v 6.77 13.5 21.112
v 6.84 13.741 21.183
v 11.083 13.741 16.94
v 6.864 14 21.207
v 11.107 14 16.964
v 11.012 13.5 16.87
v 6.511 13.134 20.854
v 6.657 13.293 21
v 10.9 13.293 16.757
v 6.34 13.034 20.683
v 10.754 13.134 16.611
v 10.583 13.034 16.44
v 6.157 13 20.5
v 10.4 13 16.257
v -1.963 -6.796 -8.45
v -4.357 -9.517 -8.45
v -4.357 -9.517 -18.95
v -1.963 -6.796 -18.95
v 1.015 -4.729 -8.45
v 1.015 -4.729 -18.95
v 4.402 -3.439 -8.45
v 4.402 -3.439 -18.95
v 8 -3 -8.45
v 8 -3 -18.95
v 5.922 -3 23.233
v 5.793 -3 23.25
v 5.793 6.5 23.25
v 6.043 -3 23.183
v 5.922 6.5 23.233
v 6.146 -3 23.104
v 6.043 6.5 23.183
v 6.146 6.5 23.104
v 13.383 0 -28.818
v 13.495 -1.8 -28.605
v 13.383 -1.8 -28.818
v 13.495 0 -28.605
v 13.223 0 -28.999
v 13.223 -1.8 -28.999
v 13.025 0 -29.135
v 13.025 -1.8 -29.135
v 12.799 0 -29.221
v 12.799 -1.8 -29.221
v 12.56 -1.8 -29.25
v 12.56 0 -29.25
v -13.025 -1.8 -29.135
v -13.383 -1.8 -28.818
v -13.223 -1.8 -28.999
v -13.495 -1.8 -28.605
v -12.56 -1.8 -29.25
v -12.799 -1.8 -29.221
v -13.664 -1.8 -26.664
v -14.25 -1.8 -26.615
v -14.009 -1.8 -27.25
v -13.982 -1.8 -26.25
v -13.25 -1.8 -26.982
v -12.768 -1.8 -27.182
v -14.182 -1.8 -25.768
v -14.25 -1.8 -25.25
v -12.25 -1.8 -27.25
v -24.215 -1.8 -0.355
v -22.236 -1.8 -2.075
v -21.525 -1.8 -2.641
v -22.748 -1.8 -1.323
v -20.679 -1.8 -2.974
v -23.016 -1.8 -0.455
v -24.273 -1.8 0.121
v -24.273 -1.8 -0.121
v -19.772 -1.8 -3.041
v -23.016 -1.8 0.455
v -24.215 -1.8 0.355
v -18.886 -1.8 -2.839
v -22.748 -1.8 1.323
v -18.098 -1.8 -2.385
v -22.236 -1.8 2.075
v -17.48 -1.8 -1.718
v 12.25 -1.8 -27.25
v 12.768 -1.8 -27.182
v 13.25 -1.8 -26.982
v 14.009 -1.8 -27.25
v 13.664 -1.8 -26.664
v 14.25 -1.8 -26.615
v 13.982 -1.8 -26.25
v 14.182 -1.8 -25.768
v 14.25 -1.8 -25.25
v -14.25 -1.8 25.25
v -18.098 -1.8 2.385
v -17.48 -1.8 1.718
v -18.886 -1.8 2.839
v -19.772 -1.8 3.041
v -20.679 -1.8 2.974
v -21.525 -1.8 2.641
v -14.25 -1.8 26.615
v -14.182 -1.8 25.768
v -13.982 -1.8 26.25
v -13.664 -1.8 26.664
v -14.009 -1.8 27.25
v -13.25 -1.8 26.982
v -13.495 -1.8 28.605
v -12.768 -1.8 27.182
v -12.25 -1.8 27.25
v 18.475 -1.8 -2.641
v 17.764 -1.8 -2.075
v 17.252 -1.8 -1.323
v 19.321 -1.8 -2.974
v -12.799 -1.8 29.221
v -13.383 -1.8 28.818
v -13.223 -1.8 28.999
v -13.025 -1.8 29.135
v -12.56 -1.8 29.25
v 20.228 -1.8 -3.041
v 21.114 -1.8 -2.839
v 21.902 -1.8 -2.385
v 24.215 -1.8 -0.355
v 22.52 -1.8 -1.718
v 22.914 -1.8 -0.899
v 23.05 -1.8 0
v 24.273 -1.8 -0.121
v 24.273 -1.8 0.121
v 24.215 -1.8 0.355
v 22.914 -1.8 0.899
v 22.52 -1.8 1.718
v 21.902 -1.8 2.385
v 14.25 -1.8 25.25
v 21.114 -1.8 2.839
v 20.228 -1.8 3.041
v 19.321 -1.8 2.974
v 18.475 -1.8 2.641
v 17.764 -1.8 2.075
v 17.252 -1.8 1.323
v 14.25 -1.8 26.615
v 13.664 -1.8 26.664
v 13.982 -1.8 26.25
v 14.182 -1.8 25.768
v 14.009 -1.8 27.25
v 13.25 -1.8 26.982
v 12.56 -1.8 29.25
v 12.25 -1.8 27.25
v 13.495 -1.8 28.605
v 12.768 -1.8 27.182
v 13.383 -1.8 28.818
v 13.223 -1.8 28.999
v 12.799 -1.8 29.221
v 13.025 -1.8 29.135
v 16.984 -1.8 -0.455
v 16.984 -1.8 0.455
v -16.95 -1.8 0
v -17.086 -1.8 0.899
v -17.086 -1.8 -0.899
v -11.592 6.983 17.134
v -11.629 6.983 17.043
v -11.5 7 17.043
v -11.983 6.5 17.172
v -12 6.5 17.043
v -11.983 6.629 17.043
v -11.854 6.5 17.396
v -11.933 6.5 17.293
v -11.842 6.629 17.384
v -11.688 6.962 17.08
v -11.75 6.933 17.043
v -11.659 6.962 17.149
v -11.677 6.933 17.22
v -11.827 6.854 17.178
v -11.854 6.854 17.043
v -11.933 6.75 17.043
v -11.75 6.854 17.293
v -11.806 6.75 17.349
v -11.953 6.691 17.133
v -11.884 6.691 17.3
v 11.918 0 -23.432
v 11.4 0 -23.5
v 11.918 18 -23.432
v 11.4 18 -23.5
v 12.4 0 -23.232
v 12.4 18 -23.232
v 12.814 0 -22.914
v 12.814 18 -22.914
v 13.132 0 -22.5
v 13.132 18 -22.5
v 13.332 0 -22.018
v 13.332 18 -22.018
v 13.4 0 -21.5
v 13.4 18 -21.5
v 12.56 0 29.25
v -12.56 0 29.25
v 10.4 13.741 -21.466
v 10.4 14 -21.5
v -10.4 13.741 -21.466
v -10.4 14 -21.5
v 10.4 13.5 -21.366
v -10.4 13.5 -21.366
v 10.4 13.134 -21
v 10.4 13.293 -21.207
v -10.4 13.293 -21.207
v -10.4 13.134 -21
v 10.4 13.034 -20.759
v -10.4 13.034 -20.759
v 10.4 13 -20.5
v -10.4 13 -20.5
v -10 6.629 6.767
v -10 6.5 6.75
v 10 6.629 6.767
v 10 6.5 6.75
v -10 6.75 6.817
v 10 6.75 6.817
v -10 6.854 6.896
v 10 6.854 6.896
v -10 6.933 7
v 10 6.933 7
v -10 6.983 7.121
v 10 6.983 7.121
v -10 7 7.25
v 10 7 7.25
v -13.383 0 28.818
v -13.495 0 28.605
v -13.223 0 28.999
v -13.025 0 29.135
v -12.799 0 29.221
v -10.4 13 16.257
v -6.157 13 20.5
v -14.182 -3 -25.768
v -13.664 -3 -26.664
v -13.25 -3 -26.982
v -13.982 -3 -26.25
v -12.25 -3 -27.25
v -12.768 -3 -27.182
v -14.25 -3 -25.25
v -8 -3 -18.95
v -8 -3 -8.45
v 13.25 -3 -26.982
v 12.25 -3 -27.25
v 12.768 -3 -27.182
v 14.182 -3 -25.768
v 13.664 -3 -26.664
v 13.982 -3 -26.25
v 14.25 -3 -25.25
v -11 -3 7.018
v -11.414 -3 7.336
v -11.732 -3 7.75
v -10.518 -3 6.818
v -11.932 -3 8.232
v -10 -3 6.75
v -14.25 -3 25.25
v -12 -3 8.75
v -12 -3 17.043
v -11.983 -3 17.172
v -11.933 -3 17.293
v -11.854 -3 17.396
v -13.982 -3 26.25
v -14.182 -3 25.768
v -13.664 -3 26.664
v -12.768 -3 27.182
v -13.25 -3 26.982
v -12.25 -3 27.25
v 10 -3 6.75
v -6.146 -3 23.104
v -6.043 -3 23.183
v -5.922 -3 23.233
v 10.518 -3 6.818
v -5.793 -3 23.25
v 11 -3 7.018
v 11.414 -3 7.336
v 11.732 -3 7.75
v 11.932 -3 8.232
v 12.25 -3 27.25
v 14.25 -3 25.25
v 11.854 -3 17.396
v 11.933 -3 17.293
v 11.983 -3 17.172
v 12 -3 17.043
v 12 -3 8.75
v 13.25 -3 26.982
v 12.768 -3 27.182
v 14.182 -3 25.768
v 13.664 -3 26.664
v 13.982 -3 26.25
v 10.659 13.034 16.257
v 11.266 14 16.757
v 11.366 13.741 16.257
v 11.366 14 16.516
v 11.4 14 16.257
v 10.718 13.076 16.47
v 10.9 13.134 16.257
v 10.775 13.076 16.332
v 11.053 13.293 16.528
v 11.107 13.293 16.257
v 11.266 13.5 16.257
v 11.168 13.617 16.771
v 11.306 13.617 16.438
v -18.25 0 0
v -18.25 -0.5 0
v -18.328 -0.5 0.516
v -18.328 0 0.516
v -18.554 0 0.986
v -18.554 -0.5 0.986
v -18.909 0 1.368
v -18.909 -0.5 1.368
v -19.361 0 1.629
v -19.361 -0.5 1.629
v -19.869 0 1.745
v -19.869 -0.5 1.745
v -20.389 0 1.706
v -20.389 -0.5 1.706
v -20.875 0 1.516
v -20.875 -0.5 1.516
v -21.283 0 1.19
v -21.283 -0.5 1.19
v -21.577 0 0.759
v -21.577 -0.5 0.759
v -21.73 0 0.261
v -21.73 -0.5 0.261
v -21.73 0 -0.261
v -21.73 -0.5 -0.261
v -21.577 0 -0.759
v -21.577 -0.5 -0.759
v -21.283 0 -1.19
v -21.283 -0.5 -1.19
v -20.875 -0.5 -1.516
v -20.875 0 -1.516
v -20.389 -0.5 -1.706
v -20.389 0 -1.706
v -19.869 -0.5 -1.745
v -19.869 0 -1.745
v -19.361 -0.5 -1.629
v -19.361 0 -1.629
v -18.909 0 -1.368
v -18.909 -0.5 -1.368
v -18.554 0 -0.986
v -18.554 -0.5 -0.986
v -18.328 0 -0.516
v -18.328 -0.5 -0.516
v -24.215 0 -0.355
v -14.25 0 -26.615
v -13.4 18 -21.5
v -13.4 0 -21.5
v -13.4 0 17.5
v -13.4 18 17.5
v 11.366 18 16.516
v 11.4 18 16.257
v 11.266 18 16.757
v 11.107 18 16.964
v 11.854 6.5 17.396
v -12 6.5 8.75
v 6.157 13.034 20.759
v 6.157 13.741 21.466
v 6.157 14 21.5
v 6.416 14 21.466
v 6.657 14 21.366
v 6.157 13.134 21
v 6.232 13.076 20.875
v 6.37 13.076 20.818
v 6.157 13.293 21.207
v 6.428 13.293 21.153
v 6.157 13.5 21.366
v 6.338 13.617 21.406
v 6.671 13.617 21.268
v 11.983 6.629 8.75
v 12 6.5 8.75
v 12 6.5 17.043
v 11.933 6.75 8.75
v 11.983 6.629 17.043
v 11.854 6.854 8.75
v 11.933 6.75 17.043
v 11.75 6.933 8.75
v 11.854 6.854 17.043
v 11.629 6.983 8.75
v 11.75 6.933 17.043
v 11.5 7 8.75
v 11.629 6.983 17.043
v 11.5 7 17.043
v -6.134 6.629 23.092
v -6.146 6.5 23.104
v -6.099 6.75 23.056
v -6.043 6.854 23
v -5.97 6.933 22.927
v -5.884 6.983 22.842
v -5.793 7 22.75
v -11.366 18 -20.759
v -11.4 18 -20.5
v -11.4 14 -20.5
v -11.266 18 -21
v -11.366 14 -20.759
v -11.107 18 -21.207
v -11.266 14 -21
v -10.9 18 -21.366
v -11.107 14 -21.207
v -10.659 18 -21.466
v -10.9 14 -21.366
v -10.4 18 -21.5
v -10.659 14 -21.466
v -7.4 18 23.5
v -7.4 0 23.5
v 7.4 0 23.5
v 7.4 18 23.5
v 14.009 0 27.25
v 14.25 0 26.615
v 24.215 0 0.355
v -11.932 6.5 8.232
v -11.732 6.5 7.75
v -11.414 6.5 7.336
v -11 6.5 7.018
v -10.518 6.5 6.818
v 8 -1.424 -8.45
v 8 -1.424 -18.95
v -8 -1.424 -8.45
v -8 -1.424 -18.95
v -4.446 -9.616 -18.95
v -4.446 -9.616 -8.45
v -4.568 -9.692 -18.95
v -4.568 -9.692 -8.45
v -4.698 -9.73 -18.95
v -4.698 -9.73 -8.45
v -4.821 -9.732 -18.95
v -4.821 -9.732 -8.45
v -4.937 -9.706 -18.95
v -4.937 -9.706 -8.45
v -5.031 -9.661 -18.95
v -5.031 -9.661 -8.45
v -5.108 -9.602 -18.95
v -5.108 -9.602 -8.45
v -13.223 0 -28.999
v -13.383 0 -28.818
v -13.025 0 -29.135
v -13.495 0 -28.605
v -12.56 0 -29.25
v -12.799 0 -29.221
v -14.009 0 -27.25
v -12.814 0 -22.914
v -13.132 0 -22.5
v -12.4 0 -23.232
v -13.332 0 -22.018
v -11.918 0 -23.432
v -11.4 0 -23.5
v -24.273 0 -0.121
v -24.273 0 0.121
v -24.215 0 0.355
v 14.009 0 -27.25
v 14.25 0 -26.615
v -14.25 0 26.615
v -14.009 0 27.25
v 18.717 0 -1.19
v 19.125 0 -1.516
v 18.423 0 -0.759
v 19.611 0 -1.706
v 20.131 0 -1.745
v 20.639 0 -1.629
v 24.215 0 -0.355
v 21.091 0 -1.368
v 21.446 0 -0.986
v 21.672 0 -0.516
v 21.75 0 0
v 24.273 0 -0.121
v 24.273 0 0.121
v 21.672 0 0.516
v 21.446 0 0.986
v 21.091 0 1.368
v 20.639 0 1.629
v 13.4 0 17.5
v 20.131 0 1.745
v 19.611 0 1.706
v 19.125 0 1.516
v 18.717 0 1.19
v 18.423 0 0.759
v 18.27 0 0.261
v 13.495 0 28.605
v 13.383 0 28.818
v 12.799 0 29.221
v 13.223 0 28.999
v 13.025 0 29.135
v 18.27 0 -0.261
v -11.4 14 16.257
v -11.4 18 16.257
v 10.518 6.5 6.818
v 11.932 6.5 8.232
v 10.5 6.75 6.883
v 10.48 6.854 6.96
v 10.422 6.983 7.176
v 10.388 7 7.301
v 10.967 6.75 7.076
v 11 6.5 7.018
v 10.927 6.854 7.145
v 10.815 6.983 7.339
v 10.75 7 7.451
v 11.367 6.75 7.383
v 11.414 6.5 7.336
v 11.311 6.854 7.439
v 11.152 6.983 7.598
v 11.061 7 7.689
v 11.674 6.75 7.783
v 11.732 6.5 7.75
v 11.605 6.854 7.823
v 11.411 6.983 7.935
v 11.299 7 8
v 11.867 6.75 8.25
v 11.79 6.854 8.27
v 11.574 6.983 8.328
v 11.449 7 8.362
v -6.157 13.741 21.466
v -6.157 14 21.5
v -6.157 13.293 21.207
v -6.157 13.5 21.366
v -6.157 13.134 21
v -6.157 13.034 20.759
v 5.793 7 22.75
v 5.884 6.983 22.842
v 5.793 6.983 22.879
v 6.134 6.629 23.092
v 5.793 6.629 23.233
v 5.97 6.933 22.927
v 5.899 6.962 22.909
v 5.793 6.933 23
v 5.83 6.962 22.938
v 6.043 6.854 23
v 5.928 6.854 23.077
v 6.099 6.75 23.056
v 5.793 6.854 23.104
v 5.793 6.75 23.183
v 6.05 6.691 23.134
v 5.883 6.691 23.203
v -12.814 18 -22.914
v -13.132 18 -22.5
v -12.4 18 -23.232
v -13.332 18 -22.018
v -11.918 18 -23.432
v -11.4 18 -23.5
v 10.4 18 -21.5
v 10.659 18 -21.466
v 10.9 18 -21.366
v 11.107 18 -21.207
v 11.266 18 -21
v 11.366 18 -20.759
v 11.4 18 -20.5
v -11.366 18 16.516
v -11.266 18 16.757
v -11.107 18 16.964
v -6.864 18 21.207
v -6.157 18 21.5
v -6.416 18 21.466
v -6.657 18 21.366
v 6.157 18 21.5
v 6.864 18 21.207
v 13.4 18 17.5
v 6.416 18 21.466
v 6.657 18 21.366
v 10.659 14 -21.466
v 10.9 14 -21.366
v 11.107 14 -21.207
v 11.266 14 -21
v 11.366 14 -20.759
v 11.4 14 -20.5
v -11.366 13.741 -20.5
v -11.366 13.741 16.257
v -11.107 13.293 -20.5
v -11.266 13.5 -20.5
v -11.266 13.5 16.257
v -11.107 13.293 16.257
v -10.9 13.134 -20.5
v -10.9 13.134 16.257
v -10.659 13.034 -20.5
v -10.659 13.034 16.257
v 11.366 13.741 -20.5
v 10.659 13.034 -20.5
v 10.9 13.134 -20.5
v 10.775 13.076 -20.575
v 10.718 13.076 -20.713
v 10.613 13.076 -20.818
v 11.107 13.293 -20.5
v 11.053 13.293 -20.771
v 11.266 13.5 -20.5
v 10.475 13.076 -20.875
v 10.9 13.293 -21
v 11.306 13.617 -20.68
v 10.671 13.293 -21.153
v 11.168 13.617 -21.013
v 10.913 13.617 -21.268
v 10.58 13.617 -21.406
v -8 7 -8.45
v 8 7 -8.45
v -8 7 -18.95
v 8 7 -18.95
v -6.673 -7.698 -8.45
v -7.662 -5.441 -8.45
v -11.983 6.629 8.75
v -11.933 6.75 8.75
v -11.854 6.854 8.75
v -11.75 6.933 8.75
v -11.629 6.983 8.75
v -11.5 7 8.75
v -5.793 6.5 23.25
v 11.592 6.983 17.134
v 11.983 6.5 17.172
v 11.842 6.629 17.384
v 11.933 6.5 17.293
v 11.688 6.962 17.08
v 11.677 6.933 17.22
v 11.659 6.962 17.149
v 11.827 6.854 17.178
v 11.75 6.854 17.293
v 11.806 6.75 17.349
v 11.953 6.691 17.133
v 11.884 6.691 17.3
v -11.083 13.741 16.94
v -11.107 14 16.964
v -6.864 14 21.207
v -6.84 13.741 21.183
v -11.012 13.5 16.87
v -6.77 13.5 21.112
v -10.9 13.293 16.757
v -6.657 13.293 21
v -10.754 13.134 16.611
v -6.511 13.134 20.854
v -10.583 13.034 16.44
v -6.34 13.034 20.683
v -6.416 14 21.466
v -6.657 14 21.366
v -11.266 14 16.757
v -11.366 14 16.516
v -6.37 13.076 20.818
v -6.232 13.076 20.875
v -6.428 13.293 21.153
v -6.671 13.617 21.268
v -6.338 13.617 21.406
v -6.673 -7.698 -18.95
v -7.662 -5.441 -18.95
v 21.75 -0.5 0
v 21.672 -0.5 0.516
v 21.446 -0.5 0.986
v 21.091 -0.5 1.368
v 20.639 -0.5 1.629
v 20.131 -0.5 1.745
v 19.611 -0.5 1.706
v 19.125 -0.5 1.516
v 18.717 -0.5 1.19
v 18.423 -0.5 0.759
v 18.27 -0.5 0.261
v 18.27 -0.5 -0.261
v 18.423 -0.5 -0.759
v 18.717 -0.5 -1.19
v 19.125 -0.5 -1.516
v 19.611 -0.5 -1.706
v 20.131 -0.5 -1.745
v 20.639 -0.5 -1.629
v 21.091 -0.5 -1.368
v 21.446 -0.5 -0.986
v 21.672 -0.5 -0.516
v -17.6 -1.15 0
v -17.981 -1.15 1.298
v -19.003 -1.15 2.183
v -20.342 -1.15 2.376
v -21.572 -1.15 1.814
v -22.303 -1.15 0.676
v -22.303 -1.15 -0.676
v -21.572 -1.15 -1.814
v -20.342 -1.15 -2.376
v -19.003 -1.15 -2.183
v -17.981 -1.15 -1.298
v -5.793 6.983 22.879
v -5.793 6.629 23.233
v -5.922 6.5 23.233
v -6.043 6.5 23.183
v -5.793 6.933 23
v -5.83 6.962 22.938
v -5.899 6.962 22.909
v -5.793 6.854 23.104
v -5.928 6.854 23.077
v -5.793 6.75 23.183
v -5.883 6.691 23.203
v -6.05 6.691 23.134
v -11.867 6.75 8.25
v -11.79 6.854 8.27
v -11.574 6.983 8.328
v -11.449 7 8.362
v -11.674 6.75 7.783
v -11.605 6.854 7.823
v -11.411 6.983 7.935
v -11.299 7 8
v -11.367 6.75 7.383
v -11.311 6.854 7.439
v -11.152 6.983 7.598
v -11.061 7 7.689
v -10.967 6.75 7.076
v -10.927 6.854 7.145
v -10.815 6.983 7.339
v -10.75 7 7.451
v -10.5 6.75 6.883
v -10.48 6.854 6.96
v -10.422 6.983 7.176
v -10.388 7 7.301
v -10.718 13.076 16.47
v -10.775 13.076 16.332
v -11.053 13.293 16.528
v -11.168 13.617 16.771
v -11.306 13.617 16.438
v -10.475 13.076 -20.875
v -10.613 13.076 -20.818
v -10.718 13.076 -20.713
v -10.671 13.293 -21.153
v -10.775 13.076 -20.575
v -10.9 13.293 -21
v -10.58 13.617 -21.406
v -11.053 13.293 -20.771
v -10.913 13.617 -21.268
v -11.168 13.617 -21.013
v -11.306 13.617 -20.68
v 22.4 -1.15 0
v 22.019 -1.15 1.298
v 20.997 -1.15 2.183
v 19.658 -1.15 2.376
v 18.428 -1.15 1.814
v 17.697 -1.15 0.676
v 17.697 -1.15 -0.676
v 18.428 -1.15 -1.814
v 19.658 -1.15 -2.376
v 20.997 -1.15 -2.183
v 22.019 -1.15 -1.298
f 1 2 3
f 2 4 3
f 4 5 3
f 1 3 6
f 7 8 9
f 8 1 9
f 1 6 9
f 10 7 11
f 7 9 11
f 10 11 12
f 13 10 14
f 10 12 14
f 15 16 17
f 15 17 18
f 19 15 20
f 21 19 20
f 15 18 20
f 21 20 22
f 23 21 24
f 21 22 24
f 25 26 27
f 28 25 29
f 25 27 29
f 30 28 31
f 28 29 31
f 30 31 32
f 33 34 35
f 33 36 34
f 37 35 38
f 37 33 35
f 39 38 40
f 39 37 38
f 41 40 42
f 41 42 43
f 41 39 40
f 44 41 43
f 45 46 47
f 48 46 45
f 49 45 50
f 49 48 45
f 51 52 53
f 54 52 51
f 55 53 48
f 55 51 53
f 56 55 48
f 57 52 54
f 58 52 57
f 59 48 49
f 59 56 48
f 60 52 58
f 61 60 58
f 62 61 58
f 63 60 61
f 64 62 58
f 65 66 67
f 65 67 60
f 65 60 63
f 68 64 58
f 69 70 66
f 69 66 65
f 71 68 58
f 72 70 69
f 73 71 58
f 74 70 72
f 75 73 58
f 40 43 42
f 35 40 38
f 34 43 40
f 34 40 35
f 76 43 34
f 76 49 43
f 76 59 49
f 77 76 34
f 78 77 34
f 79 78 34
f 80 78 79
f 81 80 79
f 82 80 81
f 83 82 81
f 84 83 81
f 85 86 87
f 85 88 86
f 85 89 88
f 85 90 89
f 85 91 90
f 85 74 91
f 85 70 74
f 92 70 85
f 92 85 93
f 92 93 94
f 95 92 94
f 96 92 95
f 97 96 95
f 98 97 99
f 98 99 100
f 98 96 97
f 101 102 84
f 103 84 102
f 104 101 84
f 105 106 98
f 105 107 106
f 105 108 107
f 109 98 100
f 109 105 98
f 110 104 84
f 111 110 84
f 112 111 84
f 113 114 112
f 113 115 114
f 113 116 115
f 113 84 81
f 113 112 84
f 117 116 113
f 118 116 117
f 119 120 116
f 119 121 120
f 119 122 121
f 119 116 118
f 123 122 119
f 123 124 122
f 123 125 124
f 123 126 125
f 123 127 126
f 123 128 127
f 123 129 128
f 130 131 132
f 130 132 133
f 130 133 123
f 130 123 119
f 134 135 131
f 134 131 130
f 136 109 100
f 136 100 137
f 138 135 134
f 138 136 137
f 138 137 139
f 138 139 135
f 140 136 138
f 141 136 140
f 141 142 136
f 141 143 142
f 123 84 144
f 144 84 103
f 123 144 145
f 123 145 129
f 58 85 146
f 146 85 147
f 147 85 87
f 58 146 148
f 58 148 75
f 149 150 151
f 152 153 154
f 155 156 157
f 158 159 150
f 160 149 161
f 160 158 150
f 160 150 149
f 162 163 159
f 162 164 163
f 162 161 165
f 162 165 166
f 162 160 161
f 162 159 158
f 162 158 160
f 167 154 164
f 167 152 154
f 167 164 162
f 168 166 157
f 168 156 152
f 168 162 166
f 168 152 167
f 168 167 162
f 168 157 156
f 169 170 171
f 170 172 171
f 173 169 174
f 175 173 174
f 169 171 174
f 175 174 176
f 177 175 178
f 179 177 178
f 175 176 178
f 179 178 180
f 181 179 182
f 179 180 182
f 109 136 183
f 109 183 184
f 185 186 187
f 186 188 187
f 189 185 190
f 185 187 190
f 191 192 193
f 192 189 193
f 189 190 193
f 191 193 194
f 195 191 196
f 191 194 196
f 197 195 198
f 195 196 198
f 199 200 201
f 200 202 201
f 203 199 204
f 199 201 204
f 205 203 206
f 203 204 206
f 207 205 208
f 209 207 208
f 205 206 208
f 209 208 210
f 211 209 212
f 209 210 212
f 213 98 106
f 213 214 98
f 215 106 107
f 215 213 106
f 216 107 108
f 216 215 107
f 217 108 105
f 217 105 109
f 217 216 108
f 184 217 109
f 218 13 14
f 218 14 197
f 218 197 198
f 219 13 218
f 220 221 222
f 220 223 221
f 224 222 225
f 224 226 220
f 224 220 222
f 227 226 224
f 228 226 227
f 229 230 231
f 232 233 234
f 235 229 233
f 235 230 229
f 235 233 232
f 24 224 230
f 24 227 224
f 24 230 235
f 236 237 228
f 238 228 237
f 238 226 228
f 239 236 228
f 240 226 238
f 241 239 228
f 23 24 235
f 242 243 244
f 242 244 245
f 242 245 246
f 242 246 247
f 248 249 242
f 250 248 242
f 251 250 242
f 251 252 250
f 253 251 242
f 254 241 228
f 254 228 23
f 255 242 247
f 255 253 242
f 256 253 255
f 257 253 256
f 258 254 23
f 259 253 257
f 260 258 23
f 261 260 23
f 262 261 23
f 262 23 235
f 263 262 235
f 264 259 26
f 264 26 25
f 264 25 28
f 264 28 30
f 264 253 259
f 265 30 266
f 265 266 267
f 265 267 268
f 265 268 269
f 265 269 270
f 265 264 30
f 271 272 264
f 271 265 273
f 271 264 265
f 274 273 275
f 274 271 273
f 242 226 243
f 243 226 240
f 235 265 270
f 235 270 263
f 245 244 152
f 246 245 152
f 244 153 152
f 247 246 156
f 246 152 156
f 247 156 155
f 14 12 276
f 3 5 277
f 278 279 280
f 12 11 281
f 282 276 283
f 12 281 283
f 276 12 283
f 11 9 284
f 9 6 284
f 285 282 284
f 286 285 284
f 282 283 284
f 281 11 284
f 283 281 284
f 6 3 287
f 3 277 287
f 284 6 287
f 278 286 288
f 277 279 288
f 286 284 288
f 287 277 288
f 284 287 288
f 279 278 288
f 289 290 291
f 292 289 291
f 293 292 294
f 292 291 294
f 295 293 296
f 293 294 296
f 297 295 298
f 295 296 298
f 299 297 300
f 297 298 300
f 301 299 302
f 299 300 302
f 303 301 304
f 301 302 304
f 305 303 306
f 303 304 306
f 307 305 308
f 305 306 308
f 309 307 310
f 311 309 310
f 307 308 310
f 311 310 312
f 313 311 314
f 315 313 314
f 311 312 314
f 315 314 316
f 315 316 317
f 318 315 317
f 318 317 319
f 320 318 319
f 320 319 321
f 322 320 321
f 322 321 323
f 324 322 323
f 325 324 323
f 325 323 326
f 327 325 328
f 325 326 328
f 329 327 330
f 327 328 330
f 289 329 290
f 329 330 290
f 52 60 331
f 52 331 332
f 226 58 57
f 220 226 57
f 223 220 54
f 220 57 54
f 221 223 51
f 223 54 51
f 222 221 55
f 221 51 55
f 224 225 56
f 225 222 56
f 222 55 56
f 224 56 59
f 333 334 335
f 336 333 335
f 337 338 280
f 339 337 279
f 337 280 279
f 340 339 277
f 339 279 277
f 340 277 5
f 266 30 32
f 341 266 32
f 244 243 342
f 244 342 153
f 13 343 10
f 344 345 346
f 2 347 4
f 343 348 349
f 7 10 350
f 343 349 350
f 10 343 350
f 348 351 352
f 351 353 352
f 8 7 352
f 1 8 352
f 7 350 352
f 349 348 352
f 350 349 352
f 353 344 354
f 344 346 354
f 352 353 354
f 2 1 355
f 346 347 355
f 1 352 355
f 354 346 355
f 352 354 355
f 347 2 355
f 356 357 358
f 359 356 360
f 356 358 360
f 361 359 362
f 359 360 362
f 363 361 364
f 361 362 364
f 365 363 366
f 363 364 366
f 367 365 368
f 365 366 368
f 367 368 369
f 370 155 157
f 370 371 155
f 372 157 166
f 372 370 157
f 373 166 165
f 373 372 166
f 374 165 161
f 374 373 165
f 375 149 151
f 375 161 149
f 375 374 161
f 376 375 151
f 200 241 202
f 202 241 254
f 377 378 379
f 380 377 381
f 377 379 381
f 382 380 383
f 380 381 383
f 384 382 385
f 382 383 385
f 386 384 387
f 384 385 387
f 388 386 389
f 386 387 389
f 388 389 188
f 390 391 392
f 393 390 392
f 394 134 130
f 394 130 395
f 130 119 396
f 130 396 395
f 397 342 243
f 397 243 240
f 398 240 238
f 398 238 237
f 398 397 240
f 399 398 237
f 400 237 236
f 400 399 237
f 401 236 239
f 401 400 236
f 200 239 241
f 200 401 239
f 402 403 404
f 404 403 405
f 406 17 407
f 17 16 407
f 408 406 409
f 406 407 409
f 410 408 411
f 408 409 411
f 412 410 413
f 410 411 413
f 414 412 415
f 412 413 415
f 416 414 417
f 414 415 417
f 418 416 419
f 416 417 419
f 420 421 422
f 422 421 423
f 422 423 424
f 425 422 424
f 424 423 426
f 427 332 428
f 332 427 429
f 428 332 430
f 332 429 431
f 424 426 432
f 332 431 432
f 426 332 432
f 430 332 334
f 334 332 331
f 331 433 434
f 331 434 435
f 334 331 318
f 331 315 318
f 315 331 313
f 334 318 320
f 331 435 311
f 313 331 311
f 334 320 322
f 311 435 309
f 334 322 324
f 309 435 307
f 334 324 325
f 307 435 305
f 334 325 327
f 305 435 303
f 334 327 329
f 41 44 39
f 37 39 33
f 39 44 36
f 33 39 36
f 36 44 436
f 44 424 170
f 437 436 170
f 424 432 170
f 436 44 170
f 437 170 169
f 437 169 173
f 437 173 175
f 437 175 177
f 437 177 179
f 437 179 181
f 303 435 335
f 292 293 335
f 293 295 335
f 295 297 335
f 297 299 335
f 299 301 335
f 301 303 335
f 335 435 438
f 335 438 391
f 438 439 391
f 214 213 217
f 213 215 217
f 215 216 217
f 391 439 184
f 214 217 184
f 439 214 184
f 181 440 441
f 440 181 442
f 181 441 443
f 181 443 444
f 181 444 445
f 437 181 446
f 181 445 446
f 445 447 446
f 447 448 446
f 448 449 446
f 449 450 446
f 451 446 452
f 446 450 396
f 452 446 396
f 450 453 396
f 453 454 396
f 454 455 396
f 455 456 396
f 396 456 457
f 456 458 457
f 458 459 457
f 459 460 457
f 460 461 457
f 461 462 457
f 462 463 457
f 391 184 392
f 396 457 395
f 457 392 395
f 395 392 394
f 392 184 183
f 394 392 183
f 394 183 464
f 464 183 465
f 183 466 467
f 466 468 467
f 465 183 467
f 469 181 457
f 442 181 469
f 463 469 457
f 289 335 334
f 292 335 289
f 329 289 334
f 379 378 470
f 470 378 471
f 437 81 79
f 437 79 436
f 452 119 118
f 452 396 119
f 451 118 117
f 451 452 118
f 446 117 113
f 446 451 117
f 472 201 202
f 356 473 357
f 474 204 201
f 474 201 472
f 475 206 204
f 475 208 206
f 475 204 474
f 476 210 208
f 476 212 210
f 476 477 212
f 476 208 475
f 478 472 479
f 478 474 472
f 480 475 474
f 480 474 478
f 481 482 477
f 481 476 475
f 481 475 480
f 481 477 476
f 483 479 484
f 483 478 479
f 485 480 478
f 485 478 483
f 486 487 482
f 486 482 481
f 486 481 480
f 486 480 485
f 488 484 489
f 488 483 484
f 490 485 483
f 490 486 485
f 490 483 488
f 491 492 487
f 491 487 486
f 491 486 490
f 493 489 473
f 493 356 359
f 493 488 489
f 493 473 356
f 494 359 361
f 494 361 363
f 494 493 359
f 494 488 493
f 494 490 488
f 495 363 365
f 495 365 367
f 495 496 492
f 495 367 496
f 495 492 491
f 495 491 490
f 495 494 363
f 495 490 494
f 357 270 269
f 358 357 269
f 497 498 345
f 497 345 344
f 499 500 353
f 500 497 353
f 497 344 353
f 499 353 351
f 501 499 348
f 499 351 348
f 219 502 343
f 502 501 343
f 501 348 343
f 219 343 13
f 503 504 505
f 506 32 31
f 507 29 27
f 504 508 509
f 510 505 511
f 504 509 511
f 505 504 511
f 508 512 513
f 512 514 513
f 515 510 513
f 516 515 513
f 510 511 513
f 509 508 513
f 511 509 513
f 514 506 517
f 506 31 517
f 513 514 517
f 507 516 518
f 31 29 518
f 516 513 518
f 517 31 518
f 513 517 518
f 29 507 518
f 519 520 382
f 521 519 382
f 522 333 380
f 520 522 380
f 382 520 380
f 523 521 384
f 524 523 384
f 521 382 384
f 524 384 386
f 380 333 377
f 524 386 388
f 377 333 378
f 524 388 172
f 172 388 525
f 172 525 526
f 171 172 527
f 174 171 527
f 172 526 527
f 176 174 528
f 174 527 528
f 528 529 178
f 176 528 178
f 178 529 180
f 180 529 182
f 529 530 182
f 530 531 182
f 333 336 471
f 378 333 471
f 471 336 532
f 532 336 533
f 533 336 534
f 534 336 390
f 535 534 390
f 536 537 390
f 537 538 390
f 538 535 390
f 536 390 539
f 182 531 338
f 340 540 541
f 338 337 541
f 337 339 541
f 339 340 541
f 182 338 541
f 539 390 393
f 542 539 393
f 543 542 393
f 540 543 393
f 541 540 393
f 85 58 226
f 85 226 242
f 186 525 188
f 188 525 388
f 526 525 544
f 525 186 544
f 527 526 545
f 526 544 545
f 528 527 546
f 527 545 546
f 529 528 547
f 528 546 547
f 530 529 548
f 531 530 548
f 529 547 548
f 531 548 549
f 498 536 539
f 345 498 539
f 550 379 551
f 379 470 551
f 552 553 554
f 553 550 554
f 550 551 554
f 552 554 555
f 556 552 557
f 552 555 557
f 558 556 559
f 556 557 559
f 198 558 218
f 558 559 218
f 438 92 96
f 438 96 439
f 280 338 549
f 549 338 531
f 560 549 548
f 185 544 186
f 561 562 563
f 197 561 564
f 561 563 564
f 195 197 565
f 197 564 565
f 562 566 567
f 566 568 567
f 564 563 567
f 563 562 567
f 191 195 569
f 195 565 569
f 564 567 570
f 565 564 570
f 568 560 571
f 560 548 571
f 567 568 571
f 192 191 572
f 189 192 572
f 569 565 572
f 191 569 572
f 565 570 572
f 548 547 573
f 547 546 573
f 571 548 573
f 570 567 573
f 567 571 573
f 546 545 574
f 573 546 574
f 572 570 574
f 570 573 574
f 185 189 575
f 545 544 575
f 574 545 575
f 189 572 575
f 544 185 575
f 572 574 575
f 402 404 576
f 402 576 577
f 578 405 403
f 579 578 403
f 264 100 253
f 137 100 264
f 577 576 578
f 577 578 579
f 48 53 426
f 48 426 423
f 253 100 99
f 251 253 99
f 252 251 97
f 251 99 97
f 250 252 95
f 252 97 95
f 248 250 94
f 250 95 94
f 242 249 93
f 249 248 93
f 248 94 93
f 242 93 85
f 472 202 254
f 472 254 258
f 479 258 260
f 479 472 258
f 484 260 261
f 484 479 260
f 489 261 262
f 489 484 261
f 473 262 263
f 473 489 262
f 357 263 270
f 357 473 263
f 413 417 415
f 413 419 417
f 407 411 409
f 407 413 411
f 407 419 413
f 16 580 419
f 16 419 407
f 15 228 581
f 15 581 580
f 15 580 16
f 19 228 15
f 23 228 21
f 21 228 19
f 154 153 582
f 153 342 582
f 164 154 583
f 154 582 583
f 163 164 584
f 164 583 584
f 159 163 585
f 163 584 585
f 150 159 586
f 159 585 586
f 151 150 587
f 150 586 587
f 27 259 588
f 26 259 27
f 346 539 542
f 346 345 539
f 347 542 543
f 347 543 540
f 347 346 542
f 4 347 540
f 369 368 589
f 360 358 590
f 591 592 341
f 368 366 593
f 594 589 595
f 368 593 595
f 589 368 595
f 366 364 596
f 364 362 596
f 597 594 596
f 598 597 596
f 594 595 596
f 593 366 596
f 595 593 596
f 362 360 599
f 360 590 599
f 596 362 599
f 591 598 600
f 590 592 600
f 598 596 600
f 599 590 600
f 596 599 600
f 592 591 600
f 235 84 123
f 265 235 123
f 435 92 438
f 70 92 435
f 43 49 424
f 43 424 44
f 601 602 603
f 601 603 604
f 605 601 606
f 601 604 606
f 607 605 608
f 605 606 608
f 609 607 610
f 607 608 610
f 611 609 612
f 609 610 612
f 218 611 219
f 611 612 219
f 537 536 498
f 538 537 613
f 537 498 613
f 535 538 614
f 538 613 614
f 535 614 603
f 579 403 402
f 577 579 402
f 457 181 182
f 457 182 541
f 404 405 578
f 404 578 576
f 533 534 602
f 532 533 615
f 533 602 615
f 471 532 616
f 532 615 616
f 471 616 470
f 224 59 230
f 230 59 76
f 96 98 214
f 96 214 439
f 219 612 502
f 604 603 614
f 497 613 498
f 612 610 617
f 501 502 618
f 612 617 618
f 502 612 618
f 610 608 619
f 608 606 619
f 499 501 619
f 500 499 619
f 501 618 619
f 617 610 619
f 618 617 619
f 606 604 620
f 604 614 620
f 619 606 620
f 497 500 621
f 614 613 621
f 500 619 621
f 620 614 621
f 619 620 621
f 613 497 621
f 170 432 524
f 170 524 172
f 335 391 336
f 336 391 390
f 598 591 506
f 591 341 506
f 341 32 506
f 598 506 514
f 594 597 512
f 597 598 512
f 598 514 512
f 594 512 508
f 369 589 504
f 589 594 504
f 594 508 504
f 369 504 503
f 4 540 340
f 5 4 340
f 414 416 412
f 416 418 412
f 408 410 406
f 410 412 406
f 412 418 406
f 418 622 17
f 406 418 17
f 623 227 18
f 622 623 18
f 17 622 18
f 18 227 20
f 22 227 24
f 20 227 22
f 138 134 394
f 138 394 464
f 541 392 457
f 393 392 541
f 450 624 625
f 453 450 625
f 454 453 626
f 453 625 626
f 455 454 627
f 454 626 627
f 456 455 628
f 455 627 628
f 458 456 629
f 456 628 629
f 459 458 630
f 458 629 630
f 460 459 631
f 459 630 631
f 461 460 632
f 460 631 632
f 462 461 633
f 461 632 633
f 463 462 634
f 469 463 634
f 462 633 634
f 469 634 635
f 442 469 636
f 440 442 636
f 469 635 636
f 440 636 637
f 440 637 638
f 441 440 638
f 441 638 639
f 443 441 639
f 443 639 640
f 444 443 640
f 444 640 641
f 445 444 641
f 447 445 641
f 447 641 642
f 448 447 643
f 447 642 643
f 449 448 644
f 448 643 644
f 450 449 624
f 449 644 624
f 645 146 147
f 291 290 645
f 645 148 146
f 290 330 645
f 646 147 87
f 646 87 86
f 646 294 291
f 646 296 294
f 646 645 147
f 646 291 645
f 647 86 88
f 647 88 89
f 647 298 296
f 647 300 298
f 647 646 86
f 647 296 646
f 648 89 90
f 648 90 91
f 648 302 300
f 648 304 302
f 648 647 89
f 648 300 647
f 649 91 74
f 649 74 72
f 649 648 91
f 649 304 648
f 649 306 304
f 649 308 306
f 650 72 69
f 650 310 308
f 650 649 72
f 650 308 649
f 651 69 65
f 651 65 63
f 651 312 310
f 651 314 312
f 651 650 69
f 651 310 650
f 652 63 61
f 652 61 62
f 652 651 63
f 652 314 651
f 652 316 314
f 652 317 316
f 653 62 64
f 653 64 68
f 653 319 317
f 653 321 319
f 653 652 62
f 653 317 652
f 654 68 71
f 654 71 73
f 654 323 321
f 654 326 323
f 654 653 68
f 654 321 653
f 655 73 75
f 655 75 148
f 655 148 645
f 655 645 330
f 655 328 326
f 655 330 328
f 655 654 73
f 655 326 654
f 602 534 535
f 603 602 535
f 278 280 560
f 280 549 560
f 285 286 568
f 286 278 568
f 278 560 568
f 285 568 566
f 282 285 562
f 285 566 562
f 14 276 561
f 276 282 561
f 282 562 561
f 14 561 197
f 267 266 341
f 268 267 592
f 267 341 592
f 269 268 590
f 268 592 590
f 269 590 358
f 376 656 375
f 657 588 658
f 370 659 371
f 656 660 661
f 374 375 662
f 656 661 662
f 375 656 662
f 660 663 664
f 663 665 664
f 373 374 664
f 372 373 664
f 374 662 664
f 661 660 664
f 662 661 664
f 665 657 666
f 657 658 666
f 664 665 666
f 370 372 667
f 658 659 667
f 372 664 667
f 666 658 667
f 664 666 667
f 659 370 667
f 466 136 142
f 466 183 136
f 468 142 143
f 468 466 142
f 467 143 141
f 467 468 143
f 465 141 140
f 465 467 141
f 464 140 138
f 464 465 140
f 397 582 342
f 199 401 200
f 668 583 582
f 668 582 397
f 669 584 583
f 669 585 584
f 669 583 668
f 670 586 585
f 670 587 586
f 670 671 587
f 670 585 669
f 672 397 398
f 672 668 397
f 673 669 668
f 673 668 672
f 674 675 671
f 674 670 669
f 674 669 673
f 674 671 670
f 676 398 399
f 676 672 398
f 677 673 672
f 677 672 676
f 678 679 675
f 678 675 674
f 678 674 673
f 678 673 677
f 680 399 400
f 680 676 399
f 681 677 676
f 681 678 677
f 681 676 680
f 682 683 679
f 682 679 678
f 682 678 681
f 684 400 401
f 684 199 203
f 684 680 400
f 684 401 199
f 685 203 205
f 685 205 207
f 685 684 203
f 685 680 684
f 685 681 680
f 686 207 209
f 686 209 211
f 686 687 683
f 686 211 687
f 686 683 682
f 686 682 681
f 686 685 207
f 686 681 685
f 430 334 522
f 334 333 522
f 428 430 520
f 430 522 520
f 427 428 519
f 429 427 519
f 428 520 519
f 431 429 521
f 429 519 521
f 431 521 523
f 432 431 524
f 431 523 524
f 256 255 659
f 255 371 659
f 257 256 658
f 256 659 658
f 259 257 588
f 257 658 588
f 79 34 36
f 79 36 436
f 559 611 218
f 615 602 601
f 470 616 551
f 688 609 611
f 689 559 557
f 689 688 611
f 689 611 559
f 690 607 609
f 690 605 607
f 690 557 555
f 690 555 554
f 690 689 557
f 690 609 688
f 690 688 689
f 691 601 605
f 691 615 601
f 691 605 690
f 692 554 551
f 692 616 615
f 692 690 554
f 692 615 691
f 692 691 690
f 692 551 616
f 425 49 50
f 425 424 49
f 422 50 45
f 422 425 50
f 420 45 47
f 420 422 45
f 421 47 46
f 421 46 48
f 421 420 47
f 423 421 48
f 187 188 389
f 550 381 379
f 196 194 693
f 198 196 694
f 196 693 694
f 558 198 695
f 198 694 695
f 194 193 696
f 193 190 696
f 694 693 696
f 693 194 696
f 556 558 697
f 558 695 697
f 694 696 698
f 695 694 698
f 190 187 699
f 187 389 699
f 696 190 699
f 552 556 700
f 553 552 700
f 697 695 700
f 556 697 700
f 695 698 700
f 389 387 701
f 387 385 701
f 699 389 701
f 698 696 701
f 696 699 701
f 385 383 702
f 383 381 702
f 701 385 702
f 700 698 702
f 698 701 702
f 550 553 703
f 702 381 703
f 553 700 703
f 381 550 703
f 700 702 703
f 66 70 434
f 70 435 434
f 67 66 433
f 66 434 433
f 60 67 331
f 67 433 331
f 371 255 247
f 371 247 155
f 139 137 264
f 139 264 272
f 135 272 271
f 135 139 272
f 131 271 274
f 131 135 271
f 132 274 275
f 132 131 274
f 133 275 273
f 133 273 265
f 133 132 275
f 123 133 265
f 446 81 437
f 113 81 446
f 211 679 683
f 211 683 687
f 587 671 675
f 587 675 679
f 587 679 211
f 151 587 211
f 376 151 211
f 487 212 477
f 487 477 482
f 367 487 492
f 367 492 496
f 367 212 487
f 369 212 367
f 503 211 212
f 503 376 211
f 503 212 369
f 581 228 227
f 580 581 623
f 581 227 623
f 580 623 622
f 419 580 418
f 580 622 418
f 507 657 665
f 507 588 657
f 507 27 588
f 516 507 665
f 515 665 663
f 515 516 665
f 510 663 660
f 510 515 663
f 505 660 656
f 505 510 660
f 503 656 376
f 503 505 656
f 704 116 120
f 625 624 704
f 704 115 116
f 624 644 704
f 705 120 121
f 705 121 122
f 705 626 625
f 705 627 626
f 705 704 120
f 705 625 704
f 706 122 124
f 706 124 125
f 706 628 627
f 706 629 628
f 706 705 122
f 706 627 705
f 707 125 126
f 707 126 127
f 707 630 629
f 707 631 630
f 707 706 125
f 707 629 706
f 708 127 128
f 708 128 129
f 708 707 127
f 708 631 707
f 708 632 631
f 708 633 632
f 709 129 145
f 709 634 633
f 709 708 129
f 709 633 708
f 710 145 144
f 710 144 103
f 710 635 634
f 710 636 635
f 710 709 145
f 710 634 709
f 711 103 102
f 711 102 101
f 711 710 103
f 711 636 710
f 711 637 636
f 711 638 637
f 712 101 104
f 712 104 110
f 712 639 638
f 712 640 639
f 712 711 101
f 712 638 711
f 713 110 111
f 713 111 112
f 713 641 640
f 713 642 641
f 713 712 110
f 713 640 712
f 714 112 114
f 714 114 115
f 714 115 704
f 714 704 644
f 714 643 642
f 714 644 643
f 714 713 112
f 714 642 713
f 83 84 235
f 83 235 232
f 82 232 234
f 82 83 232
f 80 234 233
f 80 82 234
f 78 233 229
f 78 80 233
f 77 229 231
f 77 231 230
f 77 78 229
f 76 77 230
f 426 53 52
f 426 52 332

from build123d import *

# Parameters (mm, degrees)
F0_W          = 26.8
F0_H          = 47
F1_DEPTH      = 18
F2_SIZE       = 6
F3_R          = 2
F5_DEPTH      = 5
F6_R          = 1
F7_W          = 28.5
F7_H          = 54.5
F8_DEPTH      = 3
F10_R         = 1.75
F11_DEPTH     = 1.8
F12_T4_DEPTH  = 13
F12_T9_DEPTH  = 13
F12_T14_DEPTH = 13
F12_T19_DEPTH = 13
F12_T24_DEPTH = 13
F12_T29_DEPTH = 13
F12_T34_DEPTH = 13
F12_T39_DEPTH = 13
F13_R         = 1
F14_SIZE      = 1.3
F15_W         = 24
F15_H         = 16.5
F16_DEPTH     = 10
F17_SIZE      = 6
F19_R         = 2
F20_R         = 0.5
F21_W         = 16
F21_H         = 10.5
F22_DEPTH     = 10
F24_DEPTH     = 10.5
F25_R         = 0.5


# Not quite as in the source:
# - a fillet or chamfer that OpenCascade refuses, or shapes differently, is made with other operations: its cross-section is extruded or revolved along the edge and cut away or added


with BuildPart() as f1:
    # F0 (on Front) → F1 (new body)
    with BuildSketch(Plane.XZ):
        Rectangle(F0_W, F0_H)
    extrude(amount=-F1_DEPTH)

    # F2
    f2_edges = [f1.edges().sort_by_distance(p)[0] for p in [
        (-13.4, 9, 23.5),
        (13.4, 9, 23.5),
    ]]
    chamfer(f2_edges, length=F2_SIZE)

    # F3
    f3_edges = [f1.edges().sort_by_distance(p)[0] for p in [
        (-13.4, 9, -23.5),
        (13.4, 9, -23.5),
    ]]
    fillet(f3_edges, radius=F3_R)

    # F4 (on face) → F5 (cut)
    with BuildSketch(Plane(origin=(0, 18, 0), x_dir=(-1, 0, 0), z_dir=(0, 1, 0))):
        Polygon((-6.5715728753, 21.5), (-11.4, 16.6715728753), (-11.4, -21.5), (11.4, -21.5), (11.4, 16.6715728753), (6.5715728753, 21.5), align=None)
    extrude(amount=-F5_DEPTH, mode=Mode.SUBTRACT)

    # F6
    f6_edges = [f1.edges().sort_by_distance(p)[0] for p in [
        (-11.4, 15.5, -21.5),
        (-11.4, 15.5, 16.671573),
        (-6.571573, 15.5, 21.5),
        (6.571573, 15.5, 21.5),
        (11.4, 15.5, 16.671573),
        (11.4, 15.5, -21.5),
        (-8.985786, 13, 19.085786),
        (0, 13, 21.5),
        (8.985786, 13, 19.085786),
        (11.4, 13, -2.414214),
        (0, 13, -21.5),
        (-11.4, 13, -2.414214),
    ]]
    fillet(f6_edges, radius=F6_R)

    # F7 (on face) → F8 (join)
    with BuildSketch(Plane.XZ):
        Rectangle(F7_W, F7_H)
    extrude(amount=F8_DEPTH)

    # F10 (on offset) → F11 (join)
    with BuildSketch(Plane.XZ.offset(1.8)):
        Polygon((24.35, 0), (13.25, 29.25), (-13.25, 29.25), (-24.35, 0), (-13.25, -29.25), (13.25, -29.25), align=None)
        with Locations((-20, 0)):
            Circle(F10_R, mode=Mode.SUBTRACT)
        with Locations((20, 0)):
            Circle(F10_R, mode=Mode.SUBTRACT)
    extrude(amount=-F11_DEPTH)

    # F12: fillet of radius 2 on 4 edges, made by hand


with BuildPart() as f12_tool2:
    # F12_s3 → F12_t4 (new body)
    with BuildSketch(Plane.XZ.offset(-5)):
        with BuildLine():
            ThreePointArc((12.25, 27.25), (13.6642135624, 26.6642135624), (14.25, 25.25))
            Line((14.25, 25.25), (14.25, 27.25))
            Line((14.25, 27.25), (12.25, 27.25))
        make_face()
    extrude(amount=F12_T4_DEPTH)

    split(bisect_by=Plane.XZ.offset(1.8), keep=Keep.TOP)


with BuildPart() as f1_1:
    add(f1.part)

    # F12_t1: cut F12_tool2
    add(f12_tool2.part, mode=Mode.SUBTRACT)


with BuildPart() as f12_tool7:
    # F12_s8 → F12_t9 (new body)
    with BuildSketch(Plane.XZ.offset(-5)):
        with BuildLine():
            ThreePointArc((12.25, 27.25), (13.6642135624, 26.6642135624), (14.25, 25.25))
            Line((14.25, 25.25), (14.25, 27.25))
            Line((14.25, 27.25), (12.25, 27.25))
        make_face()
    extrude(amount=F12_T9_DEPTH)

    split(bisect_by=Plane(origin=(21.2847693156, 0, 8.0772970736), x_dir=(0, 1, 0), z_dir=(0.9349426915, 0, 0.354798765)), keep=Keep.TOP)


with BuildPart() as f1_2:
    add(f1_1.part)

    # F12_t6: cut F12_tool7
    add(f12_tool7.part, mode=Mode.SUBTRACT)


with BuildPart() as f12_tool12:
    # F12_s13 → F12_t14 (new body)
    with BuildSketch(Plane.XZ.offset(-5)):
        with BuildLine():
            ThreePointArc((-12.25, 27.25), (-13.6642135624, 26.6642135624), (-14.25, 25.25))
            Line((-14.25, 25.25), (-14.25, 27.25))
            Line((-14.25, 27.25), (-12.25, 27.25))
        make_face()
    extrude(amount=F12_T14_DEPTH)

    split(bisect_by=Plane.XZ.offset(1.8), keep=Keep.TOP)


with BuildPart() as f1_3:
    add(f1_2.part)

    # F12_t11: cut F12_tool12
    add(f12_tool12.part, mode=Mode.SUBTRACT)


with BuildPart() as f12_tool17:
    # F12_s18 → F12_t19 (new body)
    with BuildSketch(Plane.XZ.offset(-5)):
        with BuildLine():
            ThreePointArc((-12.25, 27.25), (-13.6642135624, 26.6642135624), (-14.25, 25.25))
            Line((-14.25, 25.25), (-14.25, 27.25))
            Line((-14.25, 27.25), (-12.25, 27.25))
        make_face()
    extrude(amount=F12_T19_DEPTH)

    split(bisect_by=Plane(origin=(-21.2847693156, 0, 8.0772970736), x_dir=(0, 1, 0), z_dir=(-0.9349426915, 0, 0.354798765)), keep=Keep.TOP)


with BuildPart() as f1_4:
    add(f1_3.part)

    # F12_t16: cut F12_tool17
    add(f12_tool17.part, mode=Mode.SUBTRACT)


with BuildPart() as f12_tool22:
    # F12_s23 → F12_t24 (new body)
    with BuildSketch(Plane.XZ.offset(-5)):
        with BuildLine():
            ThreePointArc((14.25, -25.25), (13.6642135624, -26.6642135624), (12.25, -27.25))
            Line((12.25, -27.25), (14.25, -27.25))
            Line((14.25, -27.25), (14.25, -25.25))
        make_face()
    extrude(amount=F12_T24_DEPTH)

    split(bisect_by=Plane.XZ.offset(1.8), keep=Keep.TOP)


with BuildPart() as f1_5:
    add(f1_4.part)

    # F12_t21: cut F12_tool22
    add(f12_tool22.part, mode=Mode.SUBTRACT)


with BuildPart() as f12_tool27:
    # F12_s28 → F12_t29 (new body)
    with BuildSketch(Plane.XZ.offset(-5)):
        with BuildLine():
            ThreePointArc((14.25, -25.25), (13.6642135624, -26.6642135624), (12.25, -27.25))
            Line((12.25, -27.25), (14.25, -27.25))
            Line((14.25, -27.25), (14.25, -25.25))
        make_face()
    extrude(amount=F12_T29_DEPTH)

    split(bisect_by=Plane(origin=(21.2847693156, 0, -8.0772970736), x_dir=(0, 1, 0), z_dir=(0.9349426915, 0, -0.354798765)), keep=Keep.TOP)


with BuildPart() as f1_6:
    add(f1_5.part)

    # F12_t26: cut F12_tool27
    add(f12_tool27.part, mode=Mode.SUBTRACT)


with BuildPart() as f12_tool32:
    # F12_s33 → F12_t34 (new body)
    with BuildSketch(Plane.XZ.offset(-5)):
        with BuildLine():
            ThreePointArc((-14.25, -25.25), (-13.6642135624, -26.6642135624), (-12.25, -27.25))
            Line((-12.25, -27.25), (-14.25, -27.25))
            Line((-14.25, -27.25), (-14.25, -25.25))
        make_face()
    extrude(amount=F12_T34_DEPTH)

    split(bisect_by=Plane.XZ.offset(1.8), keep=Keep.TOP)


with BuildPart() as f1_7:
    add(f1_6.part)

    # F12_t31: cut F12_tool32
    add(f12_tool32.part, mode=Mode.SUBTRACT)


with BuildPart() as f12_tool37:
    # F12_s38 → F12_t39 (new body)
    with BuildSketch(Plane.XZ.offset(-5)):
        with BuildLine():
            ThreePointArc((-14.25, -25.25), (-13.6642135624, -26.6642135624), (-12.25, -27.25))
            Line((-12.25, -27.25), (-14.25, -27.25))
            Line((-14.25, -27.25), (-14.25, -25.25))
        make_face()
    extrude(amount=F12_T39_DEPTH)

    split(bisect_by=Plane(origin=(-21.2847693156, 0, -8.0772970736), x_dir=(0, 1, 0), z_dir=(-0.9349426915, 0, -0.354798765)), keep=Keep.TOP)


with BuildPart() as f1_8:
    add(f1_7.part)

    # F12_t36: cut F12_tool37
    add(f12_tool37.part, mode=Mode.SUBTRACT)

    # F13
    f13_edges = [f1_8.edges().sort_by_distance(p)[0] for p in [
        (-13.25, -0.9, 29.25),
        (13.25, -0.9, 29.25),
        (-24.35, -0.9, 0),
        (-13.25, -0.9, -29.25),
        (13.25, -0.9, -29.25),
        (24.35, -0.9, 0),
    ]]
    fillet(f13_edges, radius=F13_R)

    # F14
    f14_edges = [f1_8.edges().sort_by_distance(p)[0] for p in [
        (-21.75, -1.8, 0),
        (18.25, -1.8, 0),
    ]]
    chamfer(f14_edges, length=F14_SIZE)


with BuildPart() as f16:
    # F15 (on face) → F16 (new body)
    with BuildSketch(Plane.XZ.offset(3)):
        with Locations((0, 15)):
            Rectangle(F15_W, F15_H)
    extrude(amount=-F16_DEPTH)

    # F17
    f17_edges = [f16.edges().sort_by_distance(p)[0] for p in [
        (12, 2, 23.25),
        (-12, 2, 23.25),
    ]]
    chamfer(f17_edges, length=F17_SIZE)


with BuildPart() as f1_9:
    add(f1_8.part)

    # F18: cut F16
    add(f16.part, mode=Mode.SUBTRACT)

    # F19
    f19_edges = [f1_9.edges().sort_by_distance(p)[0] for p in [
        (-12, 2, 6.75),
        (12, 2, 6.75),
    ]]
    fillet(f19_edges, radius=F19_R)

    # F20
    f20_edges = [f1_9.edges().sort_by_distance(p)[0] for p in [
        (12, 2, 17.25),
        (6, 2, 23.25),
        (-12, 2, 17.25),
        (-6, 2, 23.25),
        (12, 7, 13),
        (11.414214, 7, 7.335786),
        (9, 7, 20.25),
        (0, 7, 6.75),
        (0, 7, 23.25),
        (-11.414214, 7, 7.335786),
        (-9, 7, 20.25),
        (-12, 7, 13),
    ]]
    fillet(f20_edges, radius=F20_R)

    # F21 (on face) → F22 (cut)
    with BuildSketch(Plane.XZ.offset(3)):
        with Locations((0, -13.7)):
            Rectangle(F21_W, F21_H)
    extrude(amount=-F22_DEPTH, mode=Mode.SUBTRACT)

    # F23 (on face) → F24 (join, through all)
    with BuildSketch(Plane.XY.offset(-18.95)):
        with BuildLine():
            ThreePointArc((-4.6646603483, -9.9856908622), (0.7682384829, -4.8622275452), (8, -3))
            Line((8, -3), (8, -1.4239461161))
            Line((8, -1.4239461161), (-8, -1.4239461161))
            Line((-8, -1.4239461161), (-8, -3))
            ThreePointArc((-8, -3), (-7.1233945241, -6.8705415453), (-4.6646603483, -9.9856908622))
        make_face()
    extrude(amount=F24_DEPTH)

    # F25
    f25_edges = [f1_9.edges().sort_by_distance(p)[0] for p in [
        (-4.66466, -9.985691, -13.7),
    ]]
    fillet(f25_edges, radius=F25_R)


solid = f1_9.part
